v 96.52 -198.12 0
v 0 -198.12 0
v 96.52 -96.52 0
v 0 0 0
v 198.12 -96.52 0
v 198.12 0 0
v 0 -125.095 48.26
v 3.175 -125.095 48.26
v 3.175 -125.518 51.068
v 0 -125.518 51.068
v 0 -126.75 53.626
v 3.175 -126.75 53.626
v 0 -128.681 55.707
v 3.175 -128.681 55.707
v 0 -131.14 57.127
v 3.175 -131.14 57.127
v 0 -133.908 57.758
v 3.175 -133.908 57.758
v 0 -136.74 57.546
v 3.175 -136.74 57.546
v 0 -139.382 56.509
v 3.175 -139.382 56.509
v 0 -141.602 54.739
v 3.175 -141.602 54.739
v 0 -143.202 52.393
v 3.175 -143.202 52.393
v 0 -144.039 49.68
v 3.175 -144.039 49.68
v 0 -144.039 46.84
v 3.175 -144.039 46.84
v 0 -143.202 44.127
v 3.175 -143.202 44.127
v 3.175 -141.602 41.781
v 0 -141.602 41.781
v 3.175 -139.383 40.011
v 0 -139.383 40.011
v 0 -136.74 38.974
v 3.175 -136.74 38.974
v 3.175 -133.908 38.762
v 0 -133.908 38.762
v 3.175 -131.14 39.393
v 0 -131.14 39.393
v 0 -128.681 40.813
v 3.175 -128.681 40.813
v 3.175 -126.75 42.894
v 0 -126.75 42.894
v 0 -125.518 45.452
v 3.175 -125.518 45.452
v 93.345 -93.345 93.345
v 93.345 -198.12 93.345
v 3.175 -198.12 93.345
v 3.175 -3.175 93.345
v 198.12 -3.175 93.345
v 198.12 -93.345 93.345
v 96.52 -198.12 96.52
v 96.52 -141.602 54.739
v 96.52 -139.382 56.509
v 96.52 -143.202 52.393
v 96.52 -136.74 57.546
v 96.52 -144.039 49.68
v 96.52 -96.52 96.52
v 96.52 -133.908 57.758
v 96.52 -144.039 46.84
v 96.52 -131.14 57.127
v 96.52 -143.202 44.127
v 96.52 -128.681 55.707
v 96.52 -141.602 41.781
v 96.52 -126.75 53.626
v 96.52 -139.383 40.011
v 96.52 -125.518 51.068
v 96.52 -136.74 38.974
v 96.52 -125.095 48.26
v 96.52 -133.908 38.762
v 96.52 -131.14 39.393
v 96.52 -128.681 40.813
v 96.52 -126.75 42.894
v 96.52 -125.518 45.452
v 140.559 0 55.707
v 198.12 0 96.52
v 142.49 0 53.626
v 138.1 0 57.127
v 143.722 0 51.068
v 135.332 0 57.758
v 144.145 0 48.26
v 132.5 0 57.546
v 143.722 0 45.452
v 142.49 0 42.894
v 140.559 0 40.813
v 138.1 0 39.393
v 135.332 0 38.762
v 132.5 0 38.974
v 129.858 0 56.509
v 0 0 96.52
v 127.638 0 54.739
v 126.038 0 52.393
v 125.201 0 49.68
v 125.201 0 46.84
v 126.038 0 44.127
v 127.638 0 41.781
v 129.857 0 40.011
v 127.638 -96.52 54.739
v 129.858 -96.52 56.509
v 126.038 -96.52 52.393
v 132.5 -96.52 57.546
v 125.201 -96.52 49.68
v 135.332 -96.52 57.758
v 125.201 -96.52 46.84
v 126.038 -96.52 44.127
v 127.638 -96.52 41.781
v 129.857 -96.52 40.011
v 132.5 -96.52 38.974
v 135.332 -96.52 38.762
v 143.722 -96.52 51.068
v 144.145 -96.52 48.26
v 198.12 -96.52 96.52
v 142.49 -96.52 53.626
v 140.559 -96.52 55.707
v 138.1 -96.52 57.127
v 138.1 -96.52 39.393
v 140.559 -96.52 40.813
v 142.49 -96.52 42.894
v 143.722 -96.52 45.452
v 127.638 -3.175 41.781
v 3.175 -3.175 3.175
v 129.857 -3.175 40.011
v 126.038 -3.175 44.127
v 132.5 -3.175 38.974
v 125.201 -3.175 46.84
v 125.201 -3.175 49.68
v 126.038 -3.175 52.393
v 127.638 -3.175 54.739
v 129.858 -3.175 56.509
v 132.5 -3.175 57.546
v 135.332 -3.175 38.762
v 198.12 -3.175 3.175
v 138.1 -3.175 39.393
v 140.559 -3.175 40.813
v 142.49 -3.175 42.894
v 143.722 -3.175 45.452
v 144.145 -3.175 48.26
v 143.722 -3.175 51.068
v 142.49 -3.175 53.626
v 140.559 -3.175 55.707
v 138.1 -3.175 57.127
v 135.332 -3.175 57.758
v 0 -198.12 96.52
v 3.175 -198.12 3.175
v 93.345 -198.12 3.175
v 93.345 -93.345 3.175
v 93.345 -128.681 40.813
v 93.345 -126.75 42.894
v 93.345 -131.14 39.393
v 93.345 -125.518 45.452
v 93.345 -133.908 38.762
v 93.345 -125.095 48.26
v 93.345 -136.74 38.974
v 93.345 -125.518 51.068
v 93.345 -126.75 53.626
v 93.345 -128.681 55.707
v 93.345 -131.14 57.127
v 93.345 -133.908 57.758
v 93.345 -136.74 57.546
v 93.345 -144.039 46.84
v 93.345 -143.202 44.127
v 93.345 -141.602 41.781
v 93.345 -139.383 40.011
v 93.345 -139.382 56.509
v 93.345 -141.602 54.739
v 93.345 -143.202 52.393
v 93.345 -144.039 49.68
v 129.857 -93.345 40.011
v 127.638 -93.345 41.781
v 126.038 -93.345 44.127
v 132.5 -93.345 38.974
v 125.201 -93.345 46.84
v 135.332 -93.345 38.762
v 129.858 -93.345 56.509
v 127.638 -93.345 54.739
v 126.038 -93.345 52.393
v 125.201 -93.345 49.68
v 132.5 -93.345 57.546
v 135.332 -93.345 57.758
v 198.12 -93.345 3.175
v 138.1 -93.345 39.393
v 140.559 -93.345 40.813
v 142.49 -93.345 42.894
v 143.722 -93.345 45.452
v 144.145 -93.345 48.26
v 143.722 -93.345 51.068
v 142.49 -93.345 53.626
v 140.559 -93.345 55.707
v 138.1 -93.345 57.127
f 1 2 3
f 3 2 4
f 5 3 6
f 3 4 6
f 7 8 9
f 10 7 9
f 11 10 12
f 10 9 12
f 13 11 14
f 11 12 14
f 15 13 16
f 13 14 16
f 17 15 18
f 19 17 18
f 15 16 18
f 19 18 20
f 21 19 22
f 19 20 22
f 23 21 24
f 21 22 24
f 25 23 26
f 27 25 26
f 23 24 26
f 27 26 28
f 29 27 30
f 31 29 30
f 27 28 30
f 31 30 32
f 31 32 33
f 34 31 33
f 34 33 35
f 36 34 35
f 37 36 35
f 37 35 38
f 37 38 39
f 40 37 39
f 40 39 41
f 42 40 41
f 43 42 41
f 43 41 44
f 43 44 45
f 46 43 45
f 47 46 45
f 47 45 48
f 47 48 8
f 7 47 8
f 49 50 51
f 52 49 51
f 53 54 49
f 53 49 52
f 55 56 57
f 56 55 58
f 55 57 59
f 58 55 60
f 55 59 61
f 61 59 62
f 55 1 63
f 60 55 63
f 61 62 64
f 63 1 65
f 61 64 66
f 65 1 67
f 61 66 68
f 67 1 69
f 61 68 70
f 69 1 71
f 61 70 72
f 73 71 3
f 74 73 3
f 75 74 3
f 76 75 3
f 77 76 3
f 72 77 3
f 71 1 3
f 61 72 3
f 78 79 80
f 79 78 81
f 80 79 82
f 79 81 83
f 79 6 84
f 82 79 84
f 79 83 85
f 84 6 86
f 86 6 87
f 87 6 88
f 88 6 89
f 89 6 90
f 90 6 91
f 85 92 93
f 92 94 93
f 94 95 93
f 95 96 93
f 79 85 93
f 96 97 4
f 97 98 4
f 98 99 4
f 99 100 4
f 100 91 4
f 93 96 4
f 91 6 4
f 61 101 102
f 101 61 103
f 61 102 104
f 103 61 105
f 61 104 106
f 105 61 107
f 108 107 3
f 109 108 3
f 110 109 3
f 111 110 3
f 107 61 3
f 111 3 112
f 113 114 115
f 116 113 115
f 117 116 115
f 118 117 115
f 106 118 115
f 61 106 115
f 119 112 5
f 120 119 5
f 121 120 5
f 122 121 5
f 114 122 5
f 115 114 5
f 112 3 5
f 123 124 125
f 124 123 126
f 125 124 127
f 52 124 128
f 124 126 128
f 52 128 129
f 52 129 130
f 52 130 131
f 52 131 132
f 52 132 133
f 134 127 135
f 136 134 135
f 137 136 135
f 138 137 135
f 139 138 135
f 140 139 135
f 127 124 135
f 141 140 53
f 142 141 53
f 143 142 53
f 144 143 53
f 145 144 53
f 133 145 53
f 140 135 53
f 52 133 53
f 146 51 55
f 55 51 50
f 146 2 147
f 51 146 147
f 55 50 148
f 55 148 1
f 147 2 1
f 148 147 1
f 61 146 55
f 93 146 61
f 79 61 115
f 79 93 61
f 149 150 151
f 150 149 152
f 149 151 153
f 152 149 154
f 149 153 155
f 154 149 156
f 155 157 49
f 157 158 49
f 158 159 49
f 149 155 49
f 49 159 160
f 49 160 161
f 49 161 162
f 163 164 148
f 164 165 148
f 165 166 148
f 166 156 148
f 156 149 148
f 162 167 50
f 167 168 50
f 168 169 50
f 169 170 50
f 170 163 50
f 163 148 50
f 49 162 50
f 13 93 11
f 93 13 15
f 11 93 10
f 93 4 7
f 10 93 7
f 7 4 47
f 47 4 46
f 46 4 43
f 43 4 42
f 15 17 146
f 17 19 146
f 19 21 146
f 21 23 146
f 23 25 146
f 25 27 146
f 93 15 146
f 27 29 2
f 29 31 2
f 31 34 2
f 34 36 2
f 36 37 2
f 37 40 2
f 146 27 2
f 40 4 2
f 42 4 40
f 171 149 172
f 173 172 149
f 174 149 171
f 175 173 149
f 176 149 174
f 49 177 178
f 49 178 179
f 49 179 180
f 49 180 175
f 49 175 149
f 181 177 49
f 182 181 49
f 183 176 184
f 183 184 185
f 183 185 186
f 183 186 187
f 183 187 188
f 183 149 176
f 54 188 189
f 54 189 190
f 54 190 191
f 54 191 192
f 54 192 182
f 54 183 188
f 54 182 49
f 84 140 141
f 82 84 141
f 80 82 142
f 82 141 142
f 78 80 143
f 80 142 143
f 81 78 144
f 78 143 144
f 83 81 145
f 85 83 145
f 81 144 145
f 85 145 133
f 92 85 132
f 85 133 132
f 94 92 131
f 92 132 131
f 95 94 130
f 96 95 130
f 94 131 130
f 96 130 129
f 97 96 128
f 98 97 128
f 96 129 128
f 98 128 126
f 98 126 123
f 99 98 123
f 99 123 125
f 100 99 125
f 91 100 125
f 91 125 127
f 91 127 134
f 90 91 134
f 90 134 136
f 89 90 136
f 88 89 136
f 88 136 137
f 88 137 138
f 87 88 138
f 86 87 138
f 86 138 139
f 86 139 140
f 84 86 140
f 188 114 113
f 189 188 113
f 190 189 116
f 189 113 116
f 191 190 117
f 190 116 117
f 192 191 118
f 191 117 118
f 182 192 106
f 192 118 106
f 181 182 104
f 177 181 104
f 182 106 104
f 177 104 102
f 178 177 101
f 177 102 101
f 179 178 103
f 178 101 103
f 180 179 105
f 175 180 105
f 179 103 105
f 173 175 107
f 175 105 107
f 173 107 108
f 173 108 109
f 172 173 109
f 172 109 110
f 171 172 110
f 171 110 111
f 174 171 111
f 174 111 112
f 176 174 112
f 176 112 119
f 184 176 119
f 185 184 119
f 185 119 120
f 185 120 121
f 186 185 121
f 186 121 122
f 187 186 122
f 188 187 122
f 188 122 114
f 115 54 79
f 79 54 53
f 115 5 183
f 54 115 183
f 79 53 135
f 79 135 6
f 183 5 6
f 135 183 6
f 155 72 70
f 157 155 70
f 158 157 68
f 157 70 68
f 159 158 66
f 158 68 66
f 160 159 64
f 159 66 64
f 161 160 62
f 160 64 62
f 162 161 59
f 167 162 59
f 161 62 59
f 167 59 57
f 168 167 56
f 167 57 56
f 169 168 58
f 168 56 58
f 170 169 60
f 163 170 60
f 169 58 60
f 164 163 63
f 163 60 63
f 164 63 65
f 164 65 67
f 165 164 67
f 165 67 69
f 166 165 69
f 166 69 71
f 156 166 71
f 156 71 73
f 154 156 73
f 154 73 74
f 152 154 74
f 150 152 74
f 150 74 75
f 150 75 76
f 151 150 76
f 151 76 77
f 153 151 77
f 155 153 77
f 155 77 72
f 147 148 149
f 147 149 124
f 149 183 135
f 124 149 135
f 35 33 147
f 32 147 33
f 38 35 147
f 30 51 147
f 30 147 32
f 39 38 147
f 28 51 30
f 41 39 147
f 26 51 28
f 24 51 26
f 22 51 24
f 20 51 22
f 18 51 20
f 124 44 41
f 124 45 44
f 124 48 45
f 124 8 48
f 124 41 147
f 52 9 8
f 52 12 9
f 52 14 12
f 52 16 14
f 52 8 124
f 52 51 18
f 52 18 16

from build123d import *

# Parameters (mm, degrees)
F1_DEPTH   = 96.52
F2_W       = 90.17
F2_H       = 90.17
F3_DEPTH   = 106.68
F4_W       = 90.17
F4_H       = 90.17
F5_DEPTH   = 194.945
F8_D       = 19.05
F8_ON_F6_D = 19.05


with BuildPart() as f1:
    # F0 (on Top) → F1 (new body)
    with BuildSketch(Plane.XY):
        Polygon((198.12, 0), (0, 0), (0, -198.12), (96.52, -198.12), (96.52, -96.52), (198.12, -96.52), align=None)
    extrude(amount=F1_DEPTH)

    # F2 (on face) → F3 (cut)
    with BuildSketch(Plane.XZ.offset(198.12)):
        with Locations((48.26, 48.26)):
            Rectangle(F2_W, F2_H)
    extrude(amount=-F3_DEPTH, mode=Mode.SUBTRACT)

    # F4 (on face) → F5 (cut, through all)
    with BuildSketch(Plane.YZ.offset(198.12)):
        with Locations((-48.26, 48.26)):
            Rectangle(F4_W, F4_H)
    extrude(amount=-F5_DEPTH, mode=Mode.SUBTRACT)

    # F8 (through all)
    with Locations(Plane(origin=(0, 0, 0), x_dir=(-1, 0, 0), z_dir=(0, 1, 0))):
        with Locations((-134.62, 48.26)):
            Hole(F8_D / 2)

    # F8 on F6 (through all)
    with Locations(Plane(origin=(0, 0, 0), x_dir=(0, -1, 0), z_dir=(-1, 0, 0))):
        with Locations((134.62, 48.26)):
            Hole(F8_ON_F6_D / 2)


solid = f1.part
